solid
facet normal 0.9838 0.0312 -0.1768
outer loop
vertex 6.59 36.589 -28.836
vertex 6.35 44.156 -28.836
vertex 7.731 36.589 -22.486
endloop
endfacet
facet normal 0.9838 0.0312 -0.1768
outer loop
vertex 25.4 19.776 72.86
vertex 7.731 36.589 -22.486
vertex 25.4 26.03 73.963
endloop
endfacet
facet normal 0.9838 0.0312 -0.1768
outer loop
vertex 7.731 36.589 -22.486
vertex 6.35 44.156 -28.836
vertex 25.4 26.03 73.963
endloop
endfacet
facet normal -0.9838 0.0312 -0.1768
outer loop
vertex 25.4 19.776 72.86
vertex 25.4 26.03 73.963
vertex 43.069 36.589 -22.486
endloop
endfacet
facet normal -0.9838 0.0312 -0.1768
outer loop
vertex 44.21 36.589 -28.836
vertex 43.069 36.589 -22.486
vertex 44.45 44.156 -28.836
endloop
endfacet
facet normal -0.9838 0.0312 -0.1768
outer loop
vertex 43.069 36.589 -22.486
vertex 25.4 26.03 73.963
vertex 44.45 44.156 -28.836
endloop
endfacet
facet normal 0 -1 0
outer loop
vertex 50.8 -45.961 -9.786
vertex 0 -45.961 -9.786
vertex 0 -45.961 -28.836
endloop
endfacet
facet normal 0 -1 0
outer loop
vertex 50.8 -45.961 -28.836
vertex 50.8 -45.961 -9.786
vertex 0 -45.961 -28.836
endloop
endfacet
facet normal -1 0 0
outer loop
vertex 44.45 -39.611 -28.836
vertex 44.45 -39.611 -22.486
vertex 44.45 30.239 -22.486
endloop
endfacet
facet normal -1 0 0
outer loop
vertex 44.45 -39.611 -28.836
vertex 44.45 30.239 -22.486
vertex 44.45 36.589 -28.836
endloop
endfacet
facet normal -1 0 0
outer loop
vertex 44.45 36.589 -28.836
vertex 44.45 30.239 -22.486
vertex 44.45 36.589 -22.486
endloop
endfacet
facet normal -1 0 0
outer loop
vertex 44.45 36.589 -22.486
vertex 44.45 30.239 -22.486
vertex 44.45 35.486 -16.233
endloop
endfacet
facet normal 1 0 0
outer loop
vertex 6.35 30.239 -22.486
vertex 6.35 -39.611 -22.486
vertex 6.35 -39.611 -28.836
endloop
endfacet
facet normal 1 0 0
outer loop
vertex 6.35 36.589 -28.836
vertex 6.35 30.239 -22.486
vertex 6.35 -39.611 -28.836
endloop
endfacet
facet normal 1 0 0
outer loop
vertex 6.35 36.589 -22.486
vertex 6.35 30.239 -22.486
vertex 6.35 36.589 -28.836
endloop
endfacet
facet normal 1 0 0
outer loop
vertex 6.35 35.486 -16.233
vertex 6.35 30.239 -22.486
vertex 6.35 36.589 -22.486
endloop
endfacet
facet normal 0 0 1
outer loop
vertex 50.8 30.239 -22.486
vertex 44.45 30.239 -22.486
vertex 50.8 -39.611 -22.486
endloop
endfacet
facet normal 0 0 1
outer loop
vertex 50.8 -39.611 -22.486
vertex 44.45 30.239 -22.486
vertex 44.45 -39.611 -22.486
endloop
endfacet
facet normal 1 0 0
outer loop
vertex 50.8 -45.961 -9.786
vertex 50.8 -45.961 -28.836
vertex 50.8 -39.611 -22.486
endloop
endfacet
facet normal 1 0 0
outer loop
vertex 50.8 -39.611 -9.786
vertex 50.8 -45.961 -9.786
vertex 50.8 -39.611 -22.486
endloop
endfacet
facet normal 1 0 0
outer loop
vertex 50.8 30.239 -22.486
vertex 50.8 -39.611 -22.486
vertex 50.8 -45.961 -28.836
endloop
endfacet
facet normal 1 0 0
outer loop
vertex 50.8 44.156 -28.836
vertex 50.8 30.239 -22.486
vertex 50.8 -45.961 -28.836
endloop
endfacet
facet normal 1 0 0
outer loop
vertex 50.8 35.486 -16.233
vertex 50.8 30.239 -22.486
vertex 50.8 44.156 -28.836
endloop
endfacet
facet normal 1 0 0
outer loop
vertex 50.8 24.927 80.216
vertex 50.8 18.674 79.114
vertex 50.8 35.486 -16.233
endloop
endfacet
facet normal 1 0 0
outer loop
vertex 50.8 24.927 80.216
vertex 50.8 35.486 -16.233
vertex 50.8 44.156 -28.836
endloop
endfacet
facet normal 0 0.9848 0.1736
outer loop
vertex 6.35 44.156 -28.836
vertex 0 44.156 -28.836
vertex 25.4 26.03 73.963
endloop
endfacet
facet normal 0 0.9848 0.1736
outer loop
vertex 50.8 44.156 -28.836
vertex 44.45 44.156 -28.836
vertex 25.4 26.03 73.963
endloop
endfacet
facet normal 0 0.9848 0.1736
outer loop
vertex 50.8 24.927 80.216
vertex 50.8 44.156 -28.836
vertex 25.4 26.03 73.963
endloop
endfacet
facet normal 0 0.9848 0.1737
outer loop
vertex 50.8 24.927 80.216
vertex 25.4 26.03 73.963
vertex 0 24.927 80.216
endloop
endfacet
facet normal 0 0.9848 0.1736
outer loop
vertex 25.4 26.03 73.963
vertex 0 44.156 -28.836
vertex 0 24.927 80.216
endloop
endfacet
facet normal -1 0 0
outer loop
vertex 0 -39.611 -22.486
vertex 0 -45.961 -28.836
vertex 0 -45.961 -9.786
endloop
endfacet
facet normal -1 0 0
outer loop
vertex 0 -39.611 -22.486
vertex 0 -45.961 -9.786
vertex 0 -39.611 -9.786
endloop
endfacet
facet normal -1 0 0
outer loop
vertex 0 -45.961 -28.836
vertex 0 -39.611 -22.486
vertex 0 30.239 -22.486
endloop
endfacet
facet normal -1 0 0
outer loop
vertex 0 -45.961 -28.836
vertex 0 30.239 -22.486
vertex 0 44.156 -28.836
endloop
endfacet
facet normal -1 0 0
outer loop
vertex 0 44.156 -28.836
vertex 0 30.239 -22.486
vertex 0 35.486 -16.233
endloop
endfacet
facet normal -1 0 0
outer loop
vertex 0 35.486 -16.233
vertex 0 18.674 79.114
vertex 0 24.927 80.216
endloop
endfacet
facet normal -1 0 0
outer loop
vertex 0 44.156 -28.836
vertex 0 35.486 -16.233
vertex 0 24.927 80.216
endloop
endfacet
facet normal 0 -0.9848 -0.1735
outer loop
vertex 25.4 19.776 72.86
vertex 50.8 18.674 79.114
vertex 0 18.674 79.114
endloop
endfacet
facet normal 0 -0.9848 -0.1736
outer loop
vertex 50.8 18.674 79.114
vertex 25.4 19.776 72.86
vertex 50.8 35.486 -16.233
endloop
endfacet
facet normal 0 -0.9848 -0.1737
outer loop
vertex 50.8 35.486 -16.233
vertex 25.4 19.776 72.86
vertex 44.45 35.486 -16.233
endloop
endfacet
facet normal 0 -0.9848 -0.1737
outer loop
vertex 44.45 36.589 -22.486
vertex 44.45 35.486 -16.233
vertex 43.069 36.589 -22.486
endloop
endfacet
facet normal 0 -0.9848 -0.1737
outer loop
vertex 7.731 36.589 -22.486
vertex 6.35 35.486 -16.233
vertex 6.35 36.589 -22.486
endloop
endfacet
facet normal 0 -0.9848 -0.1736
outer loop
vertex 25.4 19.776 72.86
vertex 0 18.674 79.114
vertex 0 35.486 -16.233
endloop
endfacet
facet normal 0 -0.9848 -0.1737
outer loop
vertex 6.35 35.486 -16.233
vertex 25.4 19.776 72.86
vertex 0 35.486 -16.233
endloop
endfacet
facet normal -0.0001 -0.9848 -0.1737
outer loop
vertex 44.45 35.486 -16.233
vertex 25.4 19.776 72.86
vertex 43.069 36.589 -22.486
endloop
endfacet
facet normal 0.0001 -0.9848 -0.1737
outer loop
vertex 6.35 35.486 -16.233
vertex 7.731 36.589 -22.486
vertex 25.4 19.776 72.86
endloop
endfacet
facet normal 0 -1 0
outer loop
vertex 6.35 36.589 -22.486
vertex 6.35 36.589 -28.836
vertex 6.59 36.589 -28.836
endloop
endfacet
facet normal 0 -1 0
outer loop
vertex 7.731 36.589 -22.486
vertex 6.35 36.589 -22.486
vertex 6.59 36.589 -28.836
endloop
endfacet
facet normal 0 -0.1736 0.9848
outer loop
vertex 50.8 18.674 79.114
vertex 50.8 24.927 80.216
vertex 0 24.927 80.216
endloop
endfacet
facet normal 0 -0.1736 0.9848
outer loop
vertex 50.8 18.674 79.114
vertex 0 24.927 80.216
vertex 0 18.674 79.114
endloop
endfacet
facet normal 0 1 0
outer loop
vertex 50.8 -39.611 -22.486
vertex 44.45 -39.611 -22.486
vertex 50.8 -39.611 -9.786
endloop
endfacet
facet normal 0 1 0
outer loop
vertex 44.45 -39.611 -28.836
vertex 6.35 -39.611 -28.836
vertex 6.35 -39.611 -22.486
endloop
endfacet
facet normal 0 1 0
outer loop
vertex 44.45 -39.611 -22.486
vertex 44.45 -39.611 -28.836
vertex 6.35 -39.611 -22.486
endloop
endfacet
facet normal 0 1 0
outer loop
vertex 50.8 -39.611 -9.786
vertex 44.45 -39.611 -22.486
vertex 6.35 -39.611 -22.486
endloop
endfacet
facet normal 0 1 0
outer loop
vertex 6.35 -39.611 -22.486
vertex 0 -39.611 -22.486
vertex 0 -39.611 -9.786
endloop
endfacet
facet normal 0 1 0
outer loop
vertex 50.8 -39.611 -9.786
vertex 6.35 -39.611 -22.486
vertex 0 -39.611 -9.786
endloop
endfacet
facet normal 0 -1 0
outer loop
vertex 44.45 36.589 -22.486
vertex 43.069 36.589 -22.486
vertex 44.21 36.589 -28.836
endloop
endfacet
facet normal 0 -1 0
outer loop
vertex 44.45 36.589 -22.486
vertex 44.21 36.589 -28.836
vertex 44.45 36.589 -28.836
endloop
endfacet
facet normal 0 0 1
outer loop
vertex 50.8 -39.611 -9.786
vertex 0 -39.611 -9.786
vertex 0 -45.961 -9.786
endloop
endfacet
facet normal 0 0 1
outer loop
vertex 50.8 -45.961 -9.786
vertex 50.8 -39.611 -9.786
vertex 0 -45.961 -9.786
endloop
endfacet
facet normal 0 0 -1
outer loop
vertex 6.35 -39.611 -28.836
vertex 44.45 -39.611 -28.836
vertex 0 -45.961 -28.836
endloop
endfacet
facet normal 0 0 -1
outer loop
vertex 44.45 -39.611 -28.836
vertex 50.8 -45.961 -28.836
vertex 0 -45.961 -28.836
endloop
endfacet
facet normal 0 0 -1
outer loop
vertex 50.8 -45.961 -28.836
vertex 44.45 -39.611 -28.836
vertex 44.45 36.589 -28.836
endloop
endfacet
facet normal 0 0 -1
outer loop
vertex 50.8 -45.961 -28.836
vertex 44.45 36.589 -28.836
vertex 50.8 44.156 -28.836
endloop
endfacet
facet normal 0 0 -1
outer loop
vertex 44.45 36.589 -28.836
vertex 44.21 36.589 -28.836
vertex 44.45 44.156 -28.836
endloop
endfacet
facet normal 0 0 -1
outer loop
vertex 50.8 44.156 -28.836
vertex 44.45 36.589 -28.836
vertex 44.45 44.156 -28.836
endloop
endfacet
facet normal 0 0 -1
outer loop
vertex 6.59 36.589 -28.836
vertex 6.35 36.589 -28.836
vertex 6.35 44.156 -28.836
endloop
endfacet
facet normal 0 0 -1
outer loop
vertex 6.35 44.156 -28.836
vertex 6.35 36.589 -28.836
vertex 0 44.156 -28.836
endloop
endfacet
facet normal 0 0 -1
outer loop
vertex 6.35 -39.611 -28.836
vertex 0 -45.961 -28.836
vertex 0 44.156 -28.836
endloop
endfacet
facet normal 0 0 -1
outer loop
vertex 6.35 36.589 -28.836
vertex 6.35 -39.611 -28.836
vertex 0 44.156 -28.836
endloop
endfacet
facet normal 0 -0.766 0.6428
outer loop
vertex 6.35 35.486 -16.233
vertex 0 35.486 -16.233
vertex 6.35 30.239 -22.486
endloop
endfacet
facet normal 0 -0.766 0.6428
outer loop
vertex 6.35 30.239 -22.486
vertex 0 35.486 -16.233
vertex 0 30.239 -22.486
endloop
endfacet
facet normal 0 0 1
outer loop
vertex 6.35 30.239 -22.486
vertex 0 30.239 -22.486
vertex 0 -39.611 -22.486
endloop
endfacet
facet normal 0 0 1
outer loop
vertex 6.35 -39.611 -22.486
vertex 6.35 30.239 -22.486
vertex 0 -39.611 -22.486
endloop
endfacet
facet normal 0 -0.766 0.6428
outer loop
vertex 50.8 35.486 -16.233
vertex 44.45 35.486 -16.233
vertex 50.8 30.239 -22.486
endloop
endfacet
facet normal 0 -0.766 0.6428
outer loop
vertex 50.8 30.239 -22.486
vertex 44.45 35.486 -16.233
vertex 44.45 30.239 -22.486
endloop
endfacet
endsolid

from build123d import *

# Parameters (mm, degrees)
F1_DEPTH    = 50.8
F2_W        = 38.1
F2_H        = 76.2
F3_DEPTH    = 25.4
F5_DEPTH    = 25.4
F6_T1_DEPTH = 6.35
F6_T3_DEPTH = 6.35


# Not quite as in the source:
# - a fillet or chamfer that OpenCascade refuses, or shapes differently, is made with other operations: its cross-section is extruded or revolved along the edge and cut away or added


with BuildPart() as f1:
    # F0 (on Right) → F1 (new body)
    with BuildSketch(Plane.YZ):
        Polygon((36.5886149989, -22.4861702016), (-39.6113850011, -22.4861702016), (-39.6113850011, -9.7861702016), (-45.9613837302, -9.7861702016), (-45.9613837302, -28.8361689307), (44.1562487973, -28.8361689307), (24.927321739, 80.2164955059), (18.673793759, 79.1138297984), align=None)
    extrude(amount=F1_DEPTH)

    # F2 (on face) → F3 (cut)
    with BuildSketch(Plane.XY.offset(-22.4861702016)):
        with Locations((25.4, -1.5113850011)):
            Rectangle(F2_W, F2_H)
    extrude(amount=-F3_DEPTH, mode=Mode.SUBTRACT)

    # F4 (on face) → F5 (cut)
    with BuildSketch(Plane(origin=(0, 37.8934996616, 6.6816463838), x_dir=(-1, 0, 0), z_dir=(0, 0.984807753, 0.1736481777))):
        Polygon((-25.4, 68.3192426996), (-44.45, -36.0657348664), (-6.35, -36.0657348664), align=None)
    extrude(amount=-F5_DEPTH, mode=Mode.SUBTRACT)

    # F6: chamfer of 6.35 on 4 edges, made by hand

    # F6_s2 → F6_t1 (join)
    with BuildSketch(Plane.YZ):
        Polygon((35.4859490708, -16.23264097), (30.2386149989, -22.4861702016), (36.5886149989, -22.4861702016), align=None)
    extrude(amount=F6_T1_DEPTH)

    # F6_s4 → F6_t3 (join)
    with BuildSketch(Plane.YZ.offset(44.45)):
        Polygon((35.4859490708, -16.23264097), (30.2386149989, -22.4861702016), (36.5886149989, -22.4861702016), align=None)
    extrude(amount=F6_T3_DEPTH)


solid = f1.part
